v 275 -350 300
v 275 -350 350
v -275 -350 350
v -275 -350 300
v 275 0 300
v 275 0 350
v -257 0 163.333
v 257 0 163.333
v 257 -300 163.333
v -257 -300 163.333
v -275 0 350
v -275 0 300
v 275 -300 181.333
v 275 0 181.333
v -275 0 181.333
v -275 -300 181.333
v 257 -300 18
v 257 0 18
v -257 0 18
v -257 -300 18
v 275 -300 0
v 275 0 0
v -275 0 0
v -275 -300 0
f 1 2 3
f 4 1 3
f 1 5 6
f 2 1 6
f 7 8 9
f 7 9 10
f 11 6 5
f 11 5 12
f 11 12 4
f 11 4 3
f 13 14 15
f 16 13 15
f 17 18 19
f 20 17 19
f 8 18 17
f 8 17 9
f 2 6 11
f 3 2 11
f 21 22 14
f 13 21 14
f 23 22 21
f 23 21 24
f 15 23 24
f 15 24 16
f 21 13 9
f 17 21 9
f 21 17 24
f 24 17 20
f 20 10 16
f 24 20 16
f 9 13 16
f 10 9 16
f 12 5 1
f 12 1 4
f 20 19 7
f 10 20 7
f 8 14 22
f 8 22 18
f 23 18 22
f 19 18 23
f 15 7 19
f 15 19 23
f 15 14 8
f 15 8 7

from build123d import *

# Parameters (mm, degrees)
F4_W     = 550
F4_H     = 50
F5_DEPTH = 350
F6_W     = 550
F6_H     = 181.3333858525
F6_W_2   = 514
F6_H_2   = 145.3333858525
F7_DEPTH = 300


# Not quite as in the source:
# - the program builds the solid bodies; features that only make, move or delete a surface that nothing else refers to are left out


with BuildPart() as f5:
    # F4 (on face) → F5 (new body)
    with BuildSketch(Plane(origin=(0, 0, 0), x_dir=(-1, 0, 0), z_dir=(0, 1, 0))):
        with Locations((0, 325)):
            Rectangle(F4_W, F4_H)
    extrude(amount=-F5_DEPTH)


with BuildPart() as f7:
    # F6 (on face) → F7 (new body)
    with BuildSketch(Plane(origin=(0, 0, 0), x_dir=(-1, 0, 0), z_dir=(0, 1, 0))):
        with Locations((0, 90.6666929262)):
            Rectangle(F6_W, F6_H)
        with Locations((0, 90.6666929262)):
            Rectangle(F6_W_2, F6_H_2, mode=Mode.SUBTRACT)
    extrude(amount=-F7_DEPTH)


solid = Compound([f5.part, f7.part])
